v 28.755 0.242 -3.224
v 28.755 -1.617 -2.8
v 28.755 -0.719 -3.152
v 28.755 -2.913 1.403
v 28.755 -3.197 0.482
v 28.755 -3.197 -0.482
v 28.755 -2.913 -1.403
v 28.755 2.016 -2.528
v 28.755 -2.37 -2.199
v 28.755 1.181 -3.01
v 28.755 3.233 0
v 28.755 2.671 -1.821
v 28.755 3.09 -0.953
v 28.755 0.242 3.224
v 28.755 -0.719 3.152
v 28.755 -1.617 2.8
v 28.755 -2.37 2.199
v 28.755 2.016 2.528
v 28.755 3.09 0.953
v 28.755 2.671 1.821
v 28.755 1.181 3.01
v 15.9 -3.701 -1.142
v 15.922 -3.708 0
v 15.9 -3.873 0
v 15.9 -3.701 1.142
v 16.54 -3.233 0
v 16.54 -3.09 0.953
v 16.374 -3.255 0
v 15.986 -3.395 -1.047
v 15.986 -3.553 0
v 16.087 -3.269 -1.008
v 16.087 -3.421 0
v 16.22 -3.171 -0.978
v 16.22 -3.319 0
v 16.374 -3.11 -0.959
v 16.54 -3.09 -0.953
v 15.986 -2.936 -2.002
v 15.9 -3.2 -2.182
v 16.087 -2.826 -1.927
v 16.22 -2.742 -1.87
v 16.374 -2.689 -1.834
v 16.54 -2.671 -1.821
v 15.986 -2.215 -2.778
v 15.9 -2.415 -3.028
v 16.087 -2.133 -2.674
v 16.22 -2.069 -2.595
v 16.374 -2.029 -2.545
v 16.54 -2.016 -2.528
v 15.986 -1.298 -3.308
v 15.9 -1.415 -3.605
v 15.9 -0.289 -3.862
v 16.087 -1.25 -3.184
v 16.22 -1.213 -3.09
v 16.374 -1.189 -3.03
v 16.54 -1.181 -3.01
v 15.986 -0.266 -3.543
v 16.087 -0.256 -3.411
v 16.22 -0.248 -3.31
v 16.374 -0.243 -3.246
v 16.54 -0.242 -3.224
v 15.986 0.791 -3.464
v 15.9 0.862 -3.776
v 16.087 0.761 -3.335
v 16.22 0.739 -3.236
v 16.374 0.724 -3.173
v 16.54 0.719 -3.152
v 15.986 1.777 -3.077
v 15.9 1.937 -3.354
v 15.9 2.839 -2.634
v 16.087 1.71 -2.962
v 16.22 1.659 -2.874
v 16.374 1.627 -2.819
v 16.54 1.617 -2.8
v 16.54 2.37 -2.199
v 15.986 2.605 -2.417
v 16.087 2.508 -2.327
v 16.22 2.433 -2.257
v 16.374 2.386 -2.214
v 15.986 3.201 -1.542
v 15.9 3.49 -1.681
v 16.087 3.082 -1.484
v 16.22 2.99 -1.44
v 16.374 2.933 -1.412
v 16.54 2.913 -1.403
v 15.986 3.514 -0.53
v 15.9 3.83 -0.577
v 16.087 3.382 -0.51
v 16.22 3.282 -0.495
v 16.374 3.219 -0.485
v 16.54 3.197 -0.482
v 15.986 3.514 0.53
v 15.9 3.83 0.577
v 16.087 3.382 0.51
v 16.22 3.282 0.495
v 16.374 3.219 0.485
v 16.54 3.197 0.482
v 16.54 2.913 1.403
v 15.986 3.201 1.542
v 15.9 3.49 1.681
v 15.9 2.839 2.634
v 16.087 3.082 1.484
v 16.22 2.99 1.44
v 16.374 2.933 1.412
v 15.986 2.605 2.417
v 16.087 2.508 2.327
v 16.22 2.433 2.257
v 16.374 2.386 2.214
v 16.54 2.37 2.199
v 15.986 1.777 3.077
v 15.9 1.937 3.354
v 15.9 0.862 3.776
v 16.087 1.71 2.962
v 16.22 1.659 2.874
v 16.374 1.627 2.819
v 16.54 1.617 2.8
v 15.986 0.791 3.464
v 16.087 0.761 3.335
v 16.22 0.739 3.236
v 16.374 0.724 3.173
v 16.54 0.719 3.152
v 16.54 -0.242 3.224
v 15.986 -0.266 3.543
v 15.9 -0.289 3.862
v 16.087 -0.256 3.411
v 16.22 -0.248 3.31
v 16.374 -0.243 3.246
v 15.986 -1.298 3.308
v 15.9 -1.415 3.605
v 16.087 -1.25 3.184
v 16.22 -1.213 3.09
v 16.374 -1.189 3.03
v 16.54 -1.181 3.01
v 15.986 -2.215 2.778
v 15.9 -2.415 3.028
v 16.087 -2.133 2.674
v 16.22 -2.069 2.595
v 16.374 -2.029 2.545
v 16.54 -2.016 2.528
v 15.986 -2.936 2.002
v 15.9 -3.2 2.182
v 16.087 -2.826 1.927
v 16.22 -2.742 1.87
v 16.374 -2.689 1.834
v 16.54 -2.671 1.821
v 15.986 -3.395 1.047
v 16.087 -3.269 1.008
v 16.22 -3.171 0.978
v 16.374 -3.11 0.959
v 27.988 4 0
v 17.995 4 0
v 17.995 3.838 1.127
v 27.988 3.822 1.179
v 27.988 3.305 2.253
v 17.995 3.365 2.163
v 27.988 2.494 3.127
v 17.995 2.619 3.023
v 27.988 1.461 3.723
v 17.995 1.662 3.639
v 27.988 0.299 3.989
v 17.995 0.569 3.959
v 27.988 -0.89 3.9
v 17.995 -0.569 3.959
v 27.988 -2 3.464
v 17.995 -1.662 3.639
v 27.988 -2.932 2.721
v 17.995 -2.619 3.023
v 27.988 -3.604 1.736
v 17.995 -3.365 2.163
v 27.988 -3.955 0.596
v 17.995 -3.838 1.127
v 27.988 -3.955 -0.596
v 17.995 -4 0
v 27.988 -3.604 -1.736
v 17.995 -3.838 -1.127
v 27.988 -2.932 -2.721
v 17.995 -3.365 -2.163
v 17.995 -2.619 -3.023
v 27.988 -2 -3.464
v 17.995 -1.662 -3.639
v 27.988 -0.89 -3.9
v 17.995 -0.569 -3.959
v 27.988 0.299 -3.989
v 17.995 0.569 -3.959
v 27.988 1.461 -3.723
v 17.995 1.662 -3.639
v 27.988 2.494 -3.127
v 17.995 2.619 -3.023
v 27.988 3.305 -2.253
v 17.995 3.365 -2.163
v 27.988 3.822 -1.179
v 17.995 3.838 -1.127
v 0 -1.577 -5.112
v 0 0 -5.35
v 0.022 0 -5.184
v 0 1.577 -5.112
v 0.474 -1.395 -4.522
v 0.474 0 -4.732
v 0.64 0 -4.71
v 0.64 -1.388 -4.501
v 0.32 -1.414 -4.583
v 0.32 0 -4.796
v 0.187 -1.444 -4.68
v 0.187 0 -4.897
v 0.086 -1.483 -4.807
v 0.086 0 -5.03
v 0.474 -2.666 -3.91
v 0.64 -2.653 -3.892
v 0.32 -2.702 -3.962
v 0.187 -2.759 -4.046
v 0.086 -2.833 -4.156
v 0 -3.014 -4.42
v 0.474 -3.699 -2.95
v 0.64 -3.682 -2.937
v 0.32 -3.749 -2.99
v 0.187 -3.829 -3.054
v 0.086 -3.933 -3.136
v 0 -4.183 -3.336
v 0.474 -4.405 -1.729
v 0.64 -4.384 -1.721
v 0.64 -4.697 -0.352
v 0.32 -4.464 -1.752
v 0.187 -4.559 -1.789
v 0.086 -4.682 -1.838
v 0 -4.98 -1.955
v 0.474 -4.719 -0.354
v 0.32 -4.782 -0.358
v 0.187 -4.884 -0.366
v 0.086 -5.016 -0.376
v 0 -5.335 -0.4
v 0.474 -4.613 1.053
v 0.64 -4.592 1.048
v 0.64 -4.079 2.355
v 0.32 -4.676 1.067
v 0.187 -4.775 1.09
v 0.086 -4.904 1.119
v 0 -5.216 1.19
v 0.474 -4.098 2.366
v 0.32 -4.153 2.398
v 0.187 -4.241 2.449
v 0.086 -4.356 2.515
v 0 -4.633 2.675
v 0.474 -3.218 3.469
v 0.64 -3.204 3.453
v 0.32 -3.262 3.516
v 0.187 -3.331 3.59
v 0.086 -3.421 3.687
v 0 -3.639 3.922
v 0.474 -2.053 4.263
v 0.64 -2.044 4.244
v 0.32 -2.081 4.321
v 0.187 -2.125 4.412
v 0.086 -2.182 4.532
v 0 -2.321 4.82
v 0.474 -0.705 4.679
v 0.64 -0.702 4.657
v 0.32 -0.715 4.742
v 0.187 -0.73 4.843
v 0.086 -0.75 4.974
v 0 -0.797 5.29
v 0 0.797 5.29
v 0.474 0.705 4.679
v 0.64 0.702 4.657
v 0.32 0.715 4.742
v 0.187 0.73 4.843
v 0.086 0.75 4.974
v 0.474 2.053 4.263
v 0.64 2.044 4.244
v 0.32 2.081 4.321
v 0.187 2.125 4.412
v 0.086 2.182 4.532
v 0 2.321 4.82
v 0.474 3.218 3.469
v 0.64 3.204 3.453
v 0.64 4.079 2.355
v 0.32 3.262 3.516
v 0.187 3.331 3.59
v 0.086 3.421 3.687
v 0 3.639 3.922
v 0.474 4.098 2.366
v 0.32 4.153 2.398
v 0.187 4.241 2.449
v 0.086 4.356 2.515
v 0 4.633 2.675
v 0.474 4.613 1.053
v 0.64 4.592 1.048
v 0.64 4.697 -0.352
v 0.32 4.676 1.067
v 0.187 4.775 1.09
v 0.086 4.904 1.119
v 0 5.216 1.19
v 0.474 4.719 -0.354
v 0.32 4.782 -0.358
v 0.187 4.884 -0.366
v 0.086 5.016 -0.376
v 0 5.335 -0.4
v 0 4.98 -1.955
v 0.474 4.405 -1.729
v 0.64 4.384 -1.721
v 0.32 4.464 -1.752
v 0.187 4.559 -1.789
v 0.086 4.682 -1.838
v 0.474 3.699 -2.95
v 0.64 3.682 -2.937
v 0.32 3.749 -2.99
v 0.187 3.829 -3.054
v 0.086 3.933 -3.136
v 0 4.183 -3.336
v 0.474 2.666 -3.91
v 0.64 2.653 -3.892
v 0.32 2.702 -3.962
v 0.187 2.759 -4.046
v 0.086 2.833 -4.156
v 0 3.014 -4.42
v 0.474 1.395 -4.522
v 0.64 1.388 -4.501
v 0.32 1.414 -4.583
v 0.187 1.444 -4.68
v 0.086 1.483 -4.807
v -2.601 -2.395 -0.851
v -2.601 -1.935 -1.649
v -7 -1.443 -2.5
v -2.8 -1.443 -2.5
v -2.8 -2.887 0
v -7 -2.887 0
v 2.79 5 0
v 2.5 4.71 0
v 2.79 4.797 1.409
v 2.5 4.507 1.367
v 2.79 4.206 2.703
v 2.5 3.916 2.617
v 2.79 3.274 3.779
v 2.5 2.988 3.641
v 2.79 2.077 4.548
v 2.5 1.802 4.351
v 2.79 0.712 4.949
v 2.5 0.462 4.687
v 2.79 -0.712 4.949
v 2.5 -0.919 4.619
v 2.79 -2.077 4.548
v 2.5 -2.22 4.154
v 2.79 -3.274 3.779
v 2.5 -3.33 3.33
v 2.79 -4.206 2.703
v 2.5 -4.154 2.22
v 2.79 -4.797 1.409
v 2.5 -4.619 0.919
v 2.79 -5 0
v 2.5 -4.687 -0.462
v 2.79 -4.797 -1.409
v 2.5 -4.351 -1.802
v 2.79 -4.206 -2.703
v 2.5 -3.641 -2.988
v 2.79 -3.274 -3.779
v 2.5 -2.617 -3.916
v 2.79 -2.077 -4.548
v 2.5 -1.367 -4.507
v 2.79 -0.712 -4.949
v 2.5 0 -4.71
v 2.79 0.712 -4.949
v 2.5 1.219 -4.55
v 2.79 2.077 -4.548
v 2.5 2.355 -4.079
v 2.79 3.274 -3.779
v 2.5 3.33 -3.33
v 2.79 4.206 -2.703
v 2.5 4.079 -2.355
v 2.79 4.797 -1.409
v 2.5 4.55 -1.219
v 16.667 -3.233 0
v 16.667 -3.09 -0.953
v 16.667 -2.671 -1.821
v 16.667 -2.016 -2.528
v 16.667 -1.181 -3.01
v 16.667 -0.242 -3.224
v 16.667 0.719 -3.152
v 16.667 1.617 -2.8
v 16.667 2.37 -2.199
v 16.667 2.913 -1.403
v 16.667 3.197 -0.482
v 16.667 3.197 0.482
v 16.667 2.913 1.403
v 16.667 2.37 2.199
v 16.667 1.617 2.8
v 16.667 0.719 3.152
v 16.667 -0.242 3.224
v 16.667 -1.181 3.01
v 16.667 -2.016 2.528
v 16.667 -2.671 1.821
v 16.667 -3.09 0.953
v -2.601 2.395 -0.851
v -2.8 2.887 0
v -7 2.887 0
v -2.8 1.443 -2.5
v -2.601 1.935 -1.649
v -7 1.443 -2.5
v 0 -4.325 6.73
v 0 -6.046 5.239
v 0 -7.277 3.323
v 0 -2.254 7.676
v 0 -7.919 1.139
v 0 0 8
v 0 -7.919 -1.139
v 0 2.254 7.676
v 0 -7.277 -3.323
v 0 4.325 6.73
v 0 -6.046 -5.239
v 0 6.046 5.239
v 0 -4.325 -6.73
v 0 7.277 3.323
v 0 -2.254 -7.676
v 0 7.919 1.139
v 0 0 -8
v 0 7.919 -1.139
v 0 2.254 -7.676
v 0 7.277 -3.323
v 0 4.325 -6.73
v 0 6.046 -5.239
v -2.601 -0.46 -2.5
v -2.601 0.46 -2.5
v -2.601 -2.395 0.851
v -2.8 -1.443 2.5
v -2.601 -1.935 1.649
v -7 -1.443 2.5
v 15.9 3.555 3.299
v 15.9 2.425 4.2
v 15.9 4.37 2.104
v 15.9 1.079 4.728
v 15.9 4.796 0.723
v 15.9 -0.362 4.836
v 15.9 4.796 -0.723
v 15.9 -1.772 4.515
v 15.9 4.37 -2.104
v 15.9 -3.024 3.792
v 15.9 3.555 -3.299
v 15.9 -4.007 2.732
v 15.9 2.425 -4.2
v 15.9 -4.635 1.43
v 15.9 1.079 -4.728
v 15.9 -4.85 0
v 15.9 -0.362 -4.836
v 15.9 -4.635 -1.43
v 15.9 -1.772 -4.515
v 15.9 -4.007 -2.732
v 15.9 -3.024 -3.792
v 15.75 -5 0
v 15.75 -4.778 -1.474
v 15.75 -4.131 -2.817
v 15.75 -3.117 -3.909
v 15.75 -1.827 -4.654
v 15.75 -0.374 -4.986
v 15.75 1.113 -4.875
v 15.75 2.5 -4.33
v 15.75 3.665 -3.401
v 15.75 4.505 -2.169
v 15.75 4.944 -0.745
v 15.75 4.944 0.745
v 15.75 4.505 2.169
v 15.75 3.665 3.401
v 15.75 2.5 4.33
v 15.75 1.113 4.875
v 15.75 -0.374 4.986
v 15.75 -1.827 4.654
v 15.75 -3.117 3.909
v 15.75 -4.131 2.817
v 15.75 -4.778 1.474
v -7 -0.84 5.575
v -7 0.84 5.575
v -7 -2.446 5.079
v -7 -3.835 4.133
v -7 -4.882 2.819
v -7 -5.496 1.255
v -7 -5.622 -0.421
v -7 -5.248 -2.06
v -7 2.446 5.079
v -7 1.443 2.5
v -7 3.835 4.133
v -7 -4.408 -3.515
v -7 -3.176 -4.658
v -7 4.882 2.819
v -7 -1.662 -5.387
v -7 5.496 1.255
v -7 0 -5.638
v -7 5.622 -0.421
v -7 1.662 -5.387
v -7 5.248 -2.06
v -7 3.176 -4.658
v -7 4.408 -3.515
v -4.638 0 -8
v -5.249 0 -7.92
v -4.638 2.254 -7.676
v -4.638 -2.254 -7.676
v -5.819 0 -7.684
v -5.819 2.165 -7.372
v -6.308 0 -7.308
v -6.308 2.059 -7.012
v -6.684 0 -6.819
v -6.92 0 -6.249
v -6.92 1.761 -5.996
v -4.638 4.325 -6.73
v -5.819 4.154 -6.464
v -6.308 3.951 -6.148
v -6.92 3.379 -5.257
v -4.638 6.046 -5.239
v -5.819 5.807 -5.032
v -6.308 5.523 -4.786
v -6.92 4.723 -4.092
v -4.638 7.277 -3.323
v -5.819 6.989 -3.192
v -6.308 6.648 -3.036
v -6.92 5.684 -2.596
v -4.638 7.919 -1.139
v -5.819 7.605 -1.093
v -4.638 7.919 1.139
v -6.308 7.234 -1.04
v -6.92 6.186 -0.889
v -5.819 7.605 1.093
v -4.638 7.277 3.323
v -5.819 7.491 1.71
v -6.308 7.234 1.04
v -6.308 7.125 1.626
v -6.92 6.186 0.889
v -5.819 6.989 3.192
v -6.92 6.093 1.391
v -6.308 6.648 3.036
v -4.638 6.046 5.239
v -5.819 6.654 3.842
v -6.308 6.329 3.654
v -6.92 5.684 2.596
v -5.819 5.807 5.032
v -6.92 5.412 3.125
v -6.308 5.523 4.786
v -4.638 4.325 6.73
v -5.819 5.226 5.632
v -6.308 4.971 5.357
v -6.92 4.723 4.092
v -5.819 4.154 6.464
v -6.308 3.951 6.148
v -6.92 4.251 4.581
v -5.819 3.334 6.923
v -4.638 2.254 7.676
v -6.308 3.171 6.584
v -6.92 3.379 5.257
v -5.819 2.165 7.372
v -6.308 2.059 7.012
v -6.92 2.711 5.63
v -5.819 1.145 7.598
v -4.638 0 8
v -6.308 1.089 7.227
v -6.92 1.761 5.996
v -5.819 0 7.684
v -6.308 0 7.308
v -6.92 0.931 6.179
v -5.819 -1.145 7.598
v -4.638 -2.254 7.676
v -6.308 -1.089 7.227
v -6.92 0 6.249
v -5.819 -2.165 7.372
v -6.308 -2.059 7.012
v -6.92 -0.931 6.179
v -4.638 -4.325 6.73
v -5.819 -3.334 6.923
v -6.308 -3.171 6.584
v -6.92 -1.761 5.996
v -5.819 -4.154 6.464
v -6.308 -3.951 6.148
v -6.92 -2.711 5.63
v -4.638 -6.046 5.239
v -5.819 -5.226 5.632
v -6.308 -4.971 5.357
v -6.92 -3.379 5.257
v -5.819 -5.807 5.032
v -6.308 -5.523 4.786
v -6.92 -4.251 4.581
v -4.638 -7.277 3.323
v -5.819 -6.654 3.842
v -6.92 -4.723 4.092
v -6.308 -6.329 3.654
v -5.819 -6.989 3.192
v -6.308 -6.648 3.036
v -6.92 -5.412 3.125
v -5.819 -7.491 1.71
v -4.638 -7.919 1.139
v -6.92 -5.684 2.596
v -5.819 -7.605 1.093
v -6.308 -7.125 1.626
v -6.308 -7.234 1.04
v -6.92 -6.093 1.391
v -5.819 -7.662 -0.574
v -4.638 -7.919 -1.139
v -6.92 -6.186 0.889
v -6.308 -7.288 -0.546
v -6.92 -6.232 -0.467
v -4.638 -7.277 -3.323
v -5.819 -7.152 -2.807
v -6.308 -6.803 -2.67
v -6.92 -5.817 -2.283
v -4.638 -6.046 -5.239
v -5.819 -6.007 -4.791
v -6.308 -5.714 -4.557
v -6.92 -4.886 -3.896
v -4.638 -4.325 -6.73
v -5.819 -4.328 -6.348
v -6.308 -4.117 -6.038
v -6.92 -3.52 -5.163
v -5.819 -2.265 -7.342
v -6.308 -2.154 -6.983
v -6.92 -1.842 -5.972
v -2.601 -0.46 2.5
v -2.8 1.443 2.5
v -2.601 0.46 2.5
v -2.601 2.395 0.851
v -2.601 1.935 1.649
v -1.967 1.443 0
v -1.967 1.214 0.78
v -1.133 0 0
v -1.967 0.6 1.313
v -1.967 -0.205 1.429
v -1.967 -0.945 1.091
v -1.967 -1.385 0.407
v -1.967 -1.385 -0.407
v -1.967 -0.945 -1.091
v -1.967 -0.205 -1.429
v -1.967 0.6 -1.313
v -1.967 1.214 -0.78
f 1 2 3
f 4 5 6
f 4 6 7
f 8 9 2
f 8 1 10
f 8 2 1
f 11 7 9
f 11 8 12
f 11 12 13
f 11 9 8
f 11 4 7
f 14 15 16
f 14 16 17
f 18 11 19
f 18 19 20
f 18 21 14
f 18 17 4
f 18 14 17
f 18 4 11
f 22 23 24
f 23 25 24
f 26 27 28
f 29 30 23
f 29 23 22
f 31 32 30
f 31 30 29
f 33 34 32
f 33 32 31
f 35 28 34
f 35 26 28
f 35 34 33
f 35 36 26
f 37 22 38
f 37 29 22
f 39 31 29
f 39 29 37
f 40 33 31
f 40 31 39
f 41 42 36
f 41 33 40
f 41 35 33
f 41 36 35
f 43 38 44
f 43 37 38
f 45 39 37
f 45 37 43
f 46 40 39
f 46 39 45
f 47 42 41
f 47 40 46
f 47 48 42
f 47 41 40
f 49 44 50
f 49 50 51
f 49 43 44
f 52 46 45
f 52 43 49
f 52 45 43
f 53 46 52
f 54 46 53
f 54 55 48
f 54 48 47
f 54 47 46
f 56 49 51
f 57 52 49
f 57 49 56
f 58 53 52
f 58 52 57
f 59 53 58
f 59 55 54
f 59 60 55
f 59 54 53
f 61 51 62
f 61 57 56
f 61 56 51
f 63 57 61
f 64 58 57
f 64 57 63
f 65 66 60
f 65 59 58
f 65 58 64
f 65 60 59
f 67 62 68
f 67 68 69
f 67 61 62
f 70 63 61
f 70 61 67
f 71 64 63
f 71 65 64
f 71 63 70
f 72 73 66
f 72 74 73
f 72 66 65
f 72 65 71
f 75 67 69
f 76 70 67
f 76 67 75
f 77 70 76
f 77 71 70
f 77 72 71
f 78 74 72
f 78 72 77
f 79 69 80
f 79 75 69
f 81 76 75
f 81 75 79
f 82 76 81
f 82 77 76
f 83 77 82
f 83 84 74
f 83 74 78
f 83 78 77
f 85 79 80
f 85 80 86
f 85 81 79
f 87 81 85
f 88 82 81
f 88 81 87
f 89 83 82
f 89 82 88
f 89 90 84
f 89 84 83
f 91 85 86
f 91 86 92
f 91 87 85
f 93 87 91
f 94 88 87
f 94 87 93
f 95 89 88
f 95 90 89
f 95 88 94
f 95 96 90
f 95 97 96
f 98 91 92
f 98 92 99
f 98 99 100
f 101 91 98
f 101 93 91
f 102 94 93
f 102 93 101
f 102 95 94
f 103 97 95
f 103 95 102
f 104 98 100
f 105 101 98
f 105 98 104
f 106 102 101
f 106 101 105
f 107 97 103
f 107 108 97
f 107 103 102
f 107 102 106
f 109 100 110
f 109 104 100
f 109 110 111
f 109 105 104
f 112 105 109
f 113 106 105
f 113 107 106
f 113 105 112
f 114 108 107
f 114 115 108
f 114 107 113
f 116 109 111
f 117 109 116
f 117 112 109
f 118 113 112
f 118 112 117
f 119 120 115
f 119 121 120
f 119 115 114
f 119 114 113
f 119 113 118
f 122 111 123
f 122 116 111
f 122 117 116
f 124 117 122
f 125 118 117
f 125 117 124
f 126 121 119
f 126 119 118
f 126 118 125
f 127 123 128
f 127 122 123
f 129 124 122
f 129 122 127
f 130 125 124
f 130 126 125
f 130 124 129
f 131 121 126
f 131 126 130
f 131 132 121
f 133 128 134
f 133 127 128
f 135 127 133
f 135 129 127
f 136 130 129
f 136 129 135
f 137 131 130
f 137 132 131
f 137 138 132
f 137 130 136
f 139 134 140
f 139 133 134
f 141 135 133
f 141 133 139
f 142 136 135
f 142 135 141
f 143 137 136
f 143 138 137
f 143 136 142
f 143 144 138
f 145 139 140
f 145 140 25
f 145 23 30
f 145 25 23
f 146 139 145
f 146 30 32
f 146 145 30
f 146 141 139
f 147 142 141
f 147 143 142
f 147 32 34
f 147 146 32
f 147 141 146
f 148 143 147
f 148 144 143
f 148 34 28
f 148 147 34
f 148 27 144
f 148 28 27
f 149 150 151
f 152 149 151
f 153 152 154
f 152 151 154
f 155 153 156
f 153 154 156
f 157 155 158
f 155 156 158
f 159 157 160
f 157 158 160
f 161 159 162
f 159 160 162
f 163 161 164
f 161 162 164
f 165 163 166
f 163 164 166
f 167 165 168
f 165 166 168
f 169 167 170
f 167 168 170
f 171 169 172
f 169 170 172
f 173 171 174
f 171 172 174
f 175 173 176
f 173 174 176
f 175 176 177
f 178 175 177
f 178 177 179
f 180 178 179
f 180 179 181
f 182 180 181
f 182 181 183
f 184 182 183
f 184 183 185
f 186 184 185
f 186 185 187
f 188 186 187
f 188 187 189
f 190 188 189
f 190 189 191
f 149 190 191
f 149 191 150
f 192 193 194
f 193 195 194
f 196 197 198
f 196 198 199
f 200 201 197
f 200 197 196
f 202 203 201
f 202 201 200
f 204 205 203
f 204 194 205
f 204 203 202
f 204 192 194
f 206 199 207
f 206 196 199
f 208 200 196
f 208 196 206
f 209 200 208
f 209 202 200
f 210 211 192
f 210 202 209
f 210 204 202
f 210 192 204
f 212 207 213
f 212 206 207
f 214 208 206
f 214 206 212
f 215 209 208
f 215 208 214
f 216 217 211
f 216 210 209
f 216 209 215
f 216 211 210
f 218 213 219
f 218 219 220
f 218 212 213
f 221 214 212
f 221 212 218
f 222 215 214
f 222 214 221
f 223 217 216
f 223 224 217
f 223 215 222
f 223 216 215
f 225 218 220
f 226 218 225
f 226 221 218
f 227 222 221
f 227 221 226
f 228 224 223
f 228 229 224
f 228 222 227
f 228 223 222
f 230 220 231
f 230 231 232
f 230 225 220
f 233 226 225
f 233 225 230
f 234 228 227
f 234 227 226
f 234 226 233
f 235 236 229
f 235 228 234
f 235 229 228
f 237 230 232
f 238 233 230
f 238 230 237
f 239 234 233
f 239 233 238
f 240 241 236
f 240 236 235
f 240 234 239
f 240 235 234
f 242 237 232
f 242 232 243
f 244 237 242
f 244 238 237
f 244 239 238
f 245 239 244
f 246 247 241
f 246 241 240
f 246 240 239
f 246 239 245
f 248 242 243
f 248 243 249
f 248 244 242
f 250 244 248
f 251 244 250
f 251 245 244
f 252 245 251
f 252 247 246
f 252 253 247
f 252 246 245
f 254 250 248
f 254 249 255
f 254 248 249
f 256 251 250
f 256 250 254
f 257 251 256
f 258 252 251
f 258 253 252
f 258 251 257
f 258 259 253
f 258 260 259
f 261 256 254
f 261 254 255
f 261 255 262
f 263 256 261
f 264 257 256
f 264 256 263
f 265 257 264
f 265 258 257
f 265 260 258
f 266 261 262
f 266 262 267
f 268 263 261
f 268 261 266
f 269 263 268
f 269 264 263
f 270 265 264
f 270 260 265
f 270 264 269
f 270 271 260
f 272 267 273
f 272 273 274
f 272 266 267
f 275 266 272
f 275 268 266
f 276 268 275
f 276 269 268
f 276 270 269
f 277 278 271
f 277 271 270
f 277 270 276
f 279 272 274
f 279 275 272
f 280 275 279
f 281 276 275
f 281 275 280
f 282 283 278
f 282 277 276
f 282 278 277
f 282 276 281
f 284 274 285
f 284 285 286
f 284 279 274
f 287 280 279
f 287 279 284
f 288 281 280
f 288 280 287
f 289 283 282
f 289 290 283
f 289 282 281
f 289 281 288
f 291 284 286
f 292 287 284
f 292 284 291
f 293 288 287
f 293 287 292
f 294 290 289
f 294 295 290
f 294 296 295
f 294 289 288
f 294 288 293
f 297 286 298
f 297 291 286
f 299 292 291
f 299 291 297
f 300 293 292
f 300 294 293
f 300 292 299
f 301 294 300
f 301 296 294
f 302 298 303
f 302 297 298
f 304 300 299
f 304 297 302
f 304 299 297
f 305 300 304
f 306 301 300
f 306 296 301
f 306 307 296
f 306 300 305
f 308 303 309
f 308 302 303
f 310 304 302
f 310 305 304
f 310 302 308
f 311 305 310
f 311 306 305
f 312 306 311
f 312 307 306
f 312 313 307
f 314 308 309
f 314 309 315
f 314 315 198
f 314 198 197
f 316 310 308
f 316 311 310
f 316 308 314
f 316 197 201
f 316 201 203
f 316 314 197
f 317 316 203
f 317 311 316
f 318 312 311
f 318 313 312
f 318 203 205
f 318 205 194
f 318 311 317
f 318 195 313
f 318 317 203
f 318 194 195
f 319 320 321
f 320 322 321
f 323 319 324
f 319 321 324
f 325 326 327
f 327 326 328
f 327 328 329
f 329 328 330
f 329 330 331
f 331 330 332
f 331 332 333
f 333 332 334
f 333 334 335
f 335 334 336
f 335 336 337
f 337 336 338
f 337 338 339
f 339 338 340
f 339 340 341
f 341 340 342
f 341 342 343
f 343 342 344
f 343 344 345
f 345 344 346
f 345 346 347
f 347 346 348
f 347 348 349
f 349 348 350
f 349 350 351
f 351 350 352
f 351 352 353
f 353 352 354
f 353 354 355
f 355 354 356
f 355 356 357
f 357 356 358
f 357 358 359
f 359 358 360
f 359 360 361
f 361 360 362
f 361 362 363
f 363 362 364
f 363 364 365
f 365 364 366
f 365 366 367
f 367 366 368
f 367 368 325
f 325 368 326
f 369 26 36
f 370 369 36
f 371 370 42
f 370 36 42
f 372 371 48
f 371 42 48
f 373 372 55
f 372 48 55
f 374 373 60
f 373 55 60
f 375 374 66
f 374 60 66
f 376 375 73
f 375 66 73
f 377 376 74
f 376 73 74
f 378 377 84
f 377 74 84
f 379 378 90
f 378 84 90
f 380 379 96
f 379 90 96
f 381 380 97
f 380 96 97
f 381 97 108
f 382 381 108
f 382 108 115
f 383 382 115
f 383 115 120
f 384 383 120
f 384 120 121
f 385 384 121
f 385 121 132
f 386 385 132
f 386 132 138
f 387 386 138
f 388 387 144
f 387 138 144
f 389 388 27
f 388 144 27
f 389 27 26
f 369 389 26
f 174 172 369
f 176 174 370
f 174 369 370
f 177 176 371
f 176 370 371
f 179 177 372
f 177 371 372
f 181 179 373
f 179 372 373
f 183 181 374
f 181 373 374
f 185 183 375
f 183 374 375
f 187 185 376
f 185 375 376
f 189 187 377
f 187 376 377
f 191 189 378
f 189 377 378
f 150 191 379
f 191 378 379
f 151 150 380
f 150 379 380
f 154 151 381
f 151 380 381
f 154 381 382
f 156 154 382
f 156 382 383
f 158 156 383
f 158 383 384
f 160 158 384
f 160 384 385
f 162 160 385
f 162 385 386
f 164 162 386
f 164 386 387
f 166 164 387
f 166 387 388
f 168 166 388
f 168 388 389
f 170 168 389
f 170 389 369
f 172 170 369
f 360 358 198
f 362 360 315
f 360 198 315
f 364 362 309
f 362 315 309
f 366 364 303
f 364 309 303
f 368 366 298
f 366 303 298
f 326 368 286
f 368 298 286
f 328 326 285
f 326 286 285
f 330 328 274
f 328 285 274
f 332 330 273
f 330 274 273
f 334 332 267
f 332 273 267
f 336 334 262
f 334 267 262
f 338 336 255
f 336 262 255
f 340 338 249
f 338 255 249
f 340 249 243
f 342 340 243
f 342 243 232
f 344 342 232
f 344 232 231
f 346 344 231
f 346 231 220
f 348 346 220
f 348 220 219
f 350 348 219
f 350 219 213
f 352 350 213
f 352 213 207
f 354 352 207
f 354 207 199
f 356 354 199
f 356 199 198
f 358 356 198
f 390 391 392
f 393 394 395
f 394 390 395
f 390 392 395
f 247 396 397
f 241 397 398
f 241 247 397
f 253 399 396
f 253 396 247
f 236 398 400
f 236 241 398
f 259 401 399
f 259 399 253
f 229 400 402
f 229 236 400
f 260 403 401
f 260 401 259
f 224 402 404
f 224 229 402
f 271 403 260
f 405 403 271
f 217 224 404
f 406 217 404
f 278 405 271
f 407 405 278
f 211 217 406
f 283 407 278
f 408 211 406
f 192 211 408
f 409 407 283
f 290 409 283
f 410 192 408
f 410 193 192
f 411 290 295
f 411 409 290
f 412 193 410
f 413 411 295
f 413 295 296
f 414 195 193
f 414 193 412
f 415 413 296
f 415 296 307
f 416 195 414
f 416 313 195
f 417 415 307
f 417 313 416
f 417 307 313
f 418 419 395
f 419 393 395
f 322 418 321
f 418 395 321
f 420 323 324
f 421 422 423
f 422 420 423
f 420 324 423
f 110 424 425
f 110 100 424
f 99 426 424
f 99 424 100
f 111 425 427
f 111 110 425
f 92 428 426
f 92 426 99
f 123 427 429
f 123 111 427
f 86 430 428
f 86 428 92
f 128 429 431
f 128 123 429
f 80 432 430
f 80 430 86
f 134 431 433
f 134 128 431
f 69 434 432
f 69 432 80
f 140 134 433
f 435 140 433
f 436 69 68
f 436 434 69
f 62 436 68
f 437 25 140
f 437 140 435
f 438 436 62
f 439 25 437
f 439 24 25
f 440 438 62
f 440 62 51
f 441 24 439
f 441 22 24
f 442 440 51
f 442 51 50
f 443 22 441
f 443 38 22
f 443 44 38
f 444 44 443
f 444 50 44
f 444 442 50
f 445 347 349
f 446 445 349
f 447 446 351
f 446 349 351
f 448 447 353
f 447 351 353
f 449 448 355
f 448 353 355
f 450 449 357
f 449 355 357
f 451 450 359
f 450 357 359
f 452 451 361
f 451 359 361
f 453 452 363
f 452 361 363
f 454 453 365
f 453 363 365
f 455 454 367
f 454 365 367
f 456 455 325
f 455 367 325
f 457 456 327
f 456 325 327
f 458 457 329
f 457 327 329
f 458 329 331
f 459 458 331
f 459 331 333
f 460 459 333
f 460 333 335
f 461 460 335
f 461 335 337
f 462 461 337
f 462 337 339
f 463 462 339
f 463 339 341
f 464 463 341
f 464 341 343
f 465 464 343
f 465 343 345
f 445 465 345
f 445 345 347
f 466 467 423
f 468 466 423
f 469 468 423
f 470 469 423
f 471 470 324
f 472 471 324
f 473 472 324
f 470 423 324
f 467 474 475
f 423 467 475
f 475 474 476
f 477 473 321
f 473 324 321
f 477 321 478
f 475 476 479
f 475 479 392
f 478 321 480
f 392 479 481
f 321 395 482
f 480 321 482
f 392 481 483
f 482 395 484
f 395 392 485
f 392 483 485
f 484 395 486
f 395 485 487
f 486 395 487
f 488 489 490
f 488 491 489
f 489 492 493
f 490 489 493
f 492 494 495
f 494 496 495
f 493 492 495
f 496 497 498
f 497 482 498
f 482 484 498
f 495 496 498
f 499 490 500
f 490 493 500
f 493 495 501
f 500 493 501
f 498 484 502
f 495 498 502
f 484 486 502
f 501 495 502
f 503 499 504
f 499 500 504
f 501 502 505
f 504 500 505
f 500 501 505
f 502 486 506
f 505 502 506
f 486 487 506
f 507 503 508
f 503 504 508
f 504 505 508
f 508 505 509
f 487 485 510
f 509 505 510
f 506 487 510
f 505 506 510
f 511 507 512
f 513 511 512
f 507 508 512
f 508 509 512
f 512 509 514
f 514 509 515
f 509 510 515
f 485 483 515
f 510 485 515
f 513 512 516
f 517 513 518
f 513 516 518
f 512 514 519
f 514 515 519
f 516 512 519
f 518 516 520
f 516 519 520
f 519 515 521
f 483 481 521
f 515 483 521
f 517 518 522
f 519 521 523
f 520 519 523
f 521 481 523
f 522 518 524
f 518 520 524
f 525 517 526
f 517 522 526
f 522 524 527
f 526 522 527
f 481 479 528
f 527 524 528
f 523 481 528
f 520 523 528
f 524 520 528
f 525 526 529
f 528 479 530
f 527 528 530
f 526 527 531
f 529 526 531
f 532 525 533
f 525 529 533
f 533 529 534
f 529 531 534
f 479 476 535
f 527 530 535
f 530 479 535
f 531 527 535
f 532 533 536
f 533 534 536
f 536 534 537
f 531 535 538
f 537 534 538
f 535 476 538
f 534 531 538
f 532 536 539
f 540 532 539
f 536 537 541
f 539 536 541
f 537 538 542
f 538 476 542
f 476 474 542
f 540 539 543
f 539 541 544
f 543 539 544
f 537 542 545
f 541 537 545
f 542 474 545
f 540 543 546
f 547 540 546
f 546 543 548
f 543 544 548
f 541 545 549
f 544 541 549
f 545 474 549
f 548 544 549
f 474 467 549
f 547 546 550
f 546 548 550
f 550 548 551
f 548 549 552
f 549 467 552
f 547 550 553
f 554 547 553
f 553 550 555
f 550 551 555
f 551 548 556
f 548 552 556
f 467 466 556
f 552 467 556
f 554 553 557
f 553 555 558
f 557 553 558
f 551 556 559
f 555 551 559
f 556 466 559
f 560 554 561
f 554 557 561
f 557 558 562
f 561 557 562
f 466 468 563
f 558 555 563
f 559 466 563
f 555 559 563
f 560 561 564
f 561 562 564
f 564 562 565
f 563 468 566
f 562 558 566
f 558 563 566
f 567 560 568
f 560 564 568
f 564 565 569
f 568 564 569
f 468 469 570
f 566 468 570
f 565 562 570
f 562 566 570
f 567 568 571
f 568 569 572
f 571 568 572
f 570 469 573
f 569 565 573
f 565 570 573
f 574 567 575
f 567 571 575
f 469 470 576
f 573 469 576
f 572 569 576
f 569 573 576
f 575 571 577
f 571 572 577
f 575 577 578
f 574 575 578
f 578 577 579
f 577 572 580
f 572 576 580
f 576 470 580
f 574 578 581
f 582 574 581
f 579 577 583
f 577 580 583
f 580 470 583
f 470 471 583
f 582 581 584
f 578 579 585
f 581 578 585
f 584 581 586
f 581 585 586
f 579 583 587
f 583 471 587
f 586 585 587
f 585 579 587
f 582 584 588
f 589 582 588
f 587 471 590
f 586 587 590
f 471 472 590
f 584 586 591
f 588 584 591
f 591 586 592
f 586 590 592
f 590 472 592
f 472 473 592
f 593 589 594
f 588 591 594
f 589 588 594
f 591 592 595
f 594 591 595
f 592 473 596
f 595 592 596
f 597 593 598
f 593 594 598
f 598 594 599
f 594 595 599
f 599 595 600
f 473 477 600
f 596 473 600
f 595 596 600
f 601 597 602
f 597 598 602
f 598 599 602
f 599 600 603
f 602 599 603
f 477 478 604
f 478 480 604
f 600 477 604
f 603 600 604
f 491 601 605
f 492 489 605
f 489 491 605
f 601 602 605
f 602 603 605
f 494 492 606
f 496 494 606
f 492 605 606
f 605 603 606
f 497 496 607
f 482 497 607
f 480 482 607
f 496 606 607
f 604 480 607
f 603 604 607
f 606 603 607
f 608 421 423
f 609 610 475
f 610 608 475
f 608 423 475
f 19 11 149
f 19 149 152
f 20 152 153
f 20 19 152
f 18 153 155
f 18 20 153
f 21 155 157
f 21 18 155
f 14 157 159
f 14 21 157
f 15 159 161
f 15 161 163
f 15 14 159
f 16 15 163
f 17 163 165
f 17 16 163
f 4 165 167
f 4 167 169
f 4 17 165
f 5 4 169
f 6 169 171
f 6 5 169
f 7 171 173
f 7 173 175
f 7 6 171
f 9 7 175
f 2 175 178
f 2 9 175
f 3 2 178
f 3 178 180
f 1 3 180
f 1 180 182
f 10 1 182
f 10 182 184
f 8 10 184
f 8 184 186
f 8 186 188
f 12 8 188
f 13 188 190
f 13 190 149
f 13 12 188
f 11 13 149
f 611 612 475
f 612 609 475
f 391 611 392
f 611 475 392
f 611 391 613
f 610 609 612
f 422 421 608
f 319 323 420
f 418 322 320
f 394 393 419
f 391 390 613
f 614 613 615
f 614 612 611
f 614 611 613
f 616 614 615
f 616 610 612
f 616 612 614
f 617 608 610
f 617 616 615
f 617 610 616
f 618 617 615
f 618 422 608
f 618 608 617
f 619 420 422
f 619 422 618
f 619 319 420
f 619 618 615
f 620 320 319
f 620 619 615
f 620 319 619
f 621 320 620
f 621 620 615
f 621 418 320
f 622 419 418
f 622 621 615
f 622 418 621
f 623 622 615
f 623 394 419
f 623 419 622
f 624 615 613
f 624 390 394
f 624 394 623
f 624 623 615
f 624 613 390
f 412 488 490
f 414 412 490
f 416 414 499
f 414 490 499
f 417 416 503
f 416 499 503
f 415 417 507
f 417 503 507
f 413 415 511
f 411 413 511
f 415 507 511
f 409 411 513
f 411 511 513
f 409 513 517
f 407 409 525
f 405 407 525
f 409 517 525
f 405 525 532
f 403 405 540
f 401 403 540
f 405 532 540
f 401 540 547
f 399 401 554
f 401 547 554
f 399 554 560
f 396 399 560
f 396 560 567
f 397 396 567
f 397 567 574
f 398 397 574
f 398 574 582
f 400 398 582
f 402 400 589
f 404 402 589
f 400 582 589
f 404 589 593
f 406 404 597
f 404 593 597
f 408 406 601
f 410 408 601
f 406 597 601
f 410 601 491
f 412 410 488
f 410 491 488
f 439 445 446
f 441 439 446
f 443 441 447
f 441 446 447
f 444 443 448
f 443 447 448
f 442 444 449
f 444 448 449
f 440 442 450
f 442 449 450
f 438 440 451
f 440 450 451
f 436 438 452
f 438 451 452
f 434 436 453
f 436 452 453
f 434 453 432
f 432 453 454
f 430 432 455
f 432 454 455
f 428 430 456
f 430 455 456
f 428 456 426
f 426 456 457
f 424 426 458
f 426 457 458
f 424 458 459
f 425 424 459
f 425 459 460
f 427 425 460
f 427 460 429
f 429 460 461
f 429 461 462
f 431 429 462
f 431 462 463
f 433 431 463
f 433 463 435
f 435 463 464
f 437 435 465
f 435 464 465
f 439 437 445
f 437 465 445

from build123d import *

# Parameters (mm, degrees)
DODANIE_WYCI_GNI_CIE1_START       = -7
DODANIE_WYCI_GNI_CIE1_OUTLINE_R   = 8
DODANIE_WYCI_GNI_CIE1_DEPTH       = 7
DODANIE_WYCI_GNI_CIE1_START_2     = -1.133333233
DODANIE_WYCI_GNI_CIE1_2_OUTLINE_R = 4.71
DODANIE_WYCI_GNI_CIE1_2_DEPTH     = 3.633333233
SZKIC2_R                          = 4.71
DODANIE_WYCI_GNI_CIE2_DEPTH       = 0.29
DODANIE_WYCI_GNI_CIE2_DRAFT       = -45
SZKIC3_R                          = 5
DODANIE_WYCI_GNI_CIE3_DEPTH       = 13.11
SZKIC4_R                          = 3.2331875
DODANIE_WYCI_GNI_CIE4_DEPTH       = 0.7668125
SZKIC5_R                          = 3.2331875
DODANIE_WYCI_GNI_CIE5_DEPTH       = 1.32815821
DODANIE_WYCI_GNI_CIE5_DRAFT       = -30
SZKIC6_R                          = 4
DODANIE_WYCI_GNI_CIE6_DEPTH       = 10.76
SFAZOWANIE1_SIZE                  = 0.7668125
SFAZOWANIE2_SIZE                  = 0.15
ZAOKR_GLENIE1_R                   = 0.64
ZAOKR_GLENIE2_R                   = 2.3622


with BuildPart() as part:
    # Dodanie-wyciągnięcie1: read off the stored shape, not the designer's step
    # Dodanie-wyciągnięcie1 outline → Dodanie-wyciągnięcie1 (new body)
    with BuildSketch(Plane(origin=(0, 0, 0), x_dir=(0, 0, -1), z_dir=(1, 0, 0)).offset(DODANIE_WYCI_GNI_CIE1_START)):
        Circle(DODANIE_WYCI_GNI_CIE1_OUTLINE_R)
        Polygon((0, 2.886751346), (2.5, 1.443375673), (2.5, -1.443375673), (0, -2.886751346), (-2.5, -1.443375673), (-2.5, 1.443375673), align=None, mode=Mode.SUBTRACT)
    extrude(amount=DODANIE_WYCI_GNI_CIE1_DEPTH)

    # Dodanie-wyci_gni_cie1 2 outline → Dodanie-wyci_gni_cie1 2 (add)
    with BuildSketch(Plane(origin=(0, 0, 0), x_dir=(0, 0, -1), z_dir=(1, 0, 0)).offset(DODANIE_WYCI_GNI_CIE1_START_2)):
        Circle(DODANIE_WYCI_GNI_CIE1_2_OUTLINE_R)
    extrude(amount=DODANIE_WYCI_GNI_CIE1_2_DEPTH)

    # Dodanie-wyci_gni_cie1 3 outline → Dodanie-wyci_gni_cie1 3 (revolve)
    with BuildSketch(Plane.YX):
        Polygon((2.886751346, -1.133333233), (0, -1.133333233), (2.886751346, -2.8), align=None)
    revolve(axis=Axis((0, 0, 0), (1, 0, 0)))


with BuildPart() as dodanie_wyci_gni_cie2_tool:
    # Szkic2 → Dodanie-wyciągnięcie2 (with draft: the straight prism first)
    with BuildSketch(Plane(origin=(2.5, 0, 0), x_dir=(0, 0, -1), z_dir=(1, 0, 0))):
        with Locations(Location((0, 0, 0), (0, 0, 90))):
            Circle(SZKIC2_R)
    extrude(amount=DODANIE_WYCI_GNI_CIE2_DEPTH)
    # Dodanie-wyciągnięcie2: the draft: its side faces are tilted about the plane it starts from
    dodanie_wyci_gni_cie2_sides = [dodanie_wyci_gni_cie2_tool.faces().sort_by_distance(p)[0] for p in [
        (2.645, -4.71, 0),
    ]]
    draft(dodanie_wyci_gni_cie2_sides, Plane(origin=(2.5, 0, 0), x_dir=(0, 0, -1), z_dir=(1, 0, 0)), DODANIE_WYCI_GNI_CIE2_DRAFT)


with BuildPart() as part_1:
    add(part.part)

    # Dodanie-wyciągnięcie2: add dodanie_wyci_gni_cie2_tool
    add(dodanie_wyci_gni_cie2_tool.part)

    # Szkic3 → Dodanie-wyciągnięcie3 (add)
    with BuildSketch(Plane(origin=(2.79, 0, 0), x_dir=(0, 0, -1), z_dir=(1, 0, 0))):
        with Locations(Location((0, 0, 0), (0, 0, 270))):
            Circle(SZKIC3_R)
    extrude(amount=DODANIE_WYCI_GNI_CIE3_DEPTH)

    # Szkic4 → Dodanie-wyciągnięcie4 (add)
    with BuildSketch(Plane(origin=(15.9, 0, 0), x_dir=(0, 0, -1), z_dir=(1, 0, 0))):
        with Locations(Location((0, 0, 0), (0, 0, 270))):
            Circle(SZKIC4_R)
    extrude(amount=DODANIE_WYCI_GNI_CIE4_DEPTH)


with BuildPart() as dodanie_wyci_gni_cie5_tool:
    # Szkic5 → Dodanie-wyciągnięcie5 (with draft: the straight prism first)
    with BuildSketch(Plane(origin=(16.6668125, 0, 0), x_dir=(0, 0, -1), z_dir=(1, 0, 0))):
        with Locations(Location((0, 0, 0), (0, 0, 270))):
            Circle(SZKIC5_R)
    extrude(amount=DODANIE_WYCI_GNI_CIE5_DEPTH)
    # Dodanie-wyciągnięcie5: the draft: its side faces are tilted about the plane it starts from
    dodanie_wyci_gni_cie5_sides = [dodanie_wyci_gni_cie5_tool.faces().sort_by_distance(p)[0] for p in [
        (17.330891605, 3.2331875, 0),
    ]]
    draft(dodanie_wyci_gni_cie5_sides, Plane(origin=(16.6668125, 0, 0), x_dir=(0, 0, -1), z_dir=(1, 0, 0)), DODANIE_WYCI_GNI_CIE5_DRAFT)


with BuildPart() as part_2:
    add(part_1.part)

    # Dodanie-wyciągnięcie5: add dodanie_wyci_gni_cie5_tool
    add(dodanie_wyci_gni_cie5_tool.part)

    # Szkic6 → Dodanie-wyciągnięcie6 (add)
    with BuildSketch(Plane(origin=(17.99497071, 0, 0), x_dir=(0, 0, -1), z_dir=(1, 0, 0))):
        with Locations(Location((0, 0, 0), (0, 0, 90))):
            Circle(SZKIC6_R)
    extrude(amount=DODANIE_WYCI_GNI_CIE6_DEPTH)

    # Sfazowanie1
    sfazowanie1_edges = [part_2.edges().sort_by_distance(p)[0] for p in [
        (28.75497071, -4, 0),
    ]]
    chamfer(sfazowanie1_edges, length=SFAZOWANIE1_SIZE)

    # Sfazowanie2
    sfazowanie2_edges = [part_2.edges().sort_by_distance(p)[0] for p in [
        (15.9, 5, 0),
    ]]
    chamfer(sfazowanie2_edges, length=SFAZOWANIE2_SIZE)

    # Zaokrąglenie1
    zaokr_glenie1_edges = [part_2.edges().sort_by_distance(p)[0] for p in [
        (0, 0, 4.71),
        (15.9, 3.2331875, 0),
    ]]
    fillet(zaokr_glenie1_edges, radius=ZAOKR_GLENIE1_R)

    # Zaokrąglenie2
    zaokr_glenie2_edges = [part_2.edges().sort_by_distance(p)[0] for p in [
        (-7, 0, 8),
    ]]
    fillet(zaokr_glenie2_edges, radius=ZAOKR_GLENIE2_R)


solid = part_2.part
